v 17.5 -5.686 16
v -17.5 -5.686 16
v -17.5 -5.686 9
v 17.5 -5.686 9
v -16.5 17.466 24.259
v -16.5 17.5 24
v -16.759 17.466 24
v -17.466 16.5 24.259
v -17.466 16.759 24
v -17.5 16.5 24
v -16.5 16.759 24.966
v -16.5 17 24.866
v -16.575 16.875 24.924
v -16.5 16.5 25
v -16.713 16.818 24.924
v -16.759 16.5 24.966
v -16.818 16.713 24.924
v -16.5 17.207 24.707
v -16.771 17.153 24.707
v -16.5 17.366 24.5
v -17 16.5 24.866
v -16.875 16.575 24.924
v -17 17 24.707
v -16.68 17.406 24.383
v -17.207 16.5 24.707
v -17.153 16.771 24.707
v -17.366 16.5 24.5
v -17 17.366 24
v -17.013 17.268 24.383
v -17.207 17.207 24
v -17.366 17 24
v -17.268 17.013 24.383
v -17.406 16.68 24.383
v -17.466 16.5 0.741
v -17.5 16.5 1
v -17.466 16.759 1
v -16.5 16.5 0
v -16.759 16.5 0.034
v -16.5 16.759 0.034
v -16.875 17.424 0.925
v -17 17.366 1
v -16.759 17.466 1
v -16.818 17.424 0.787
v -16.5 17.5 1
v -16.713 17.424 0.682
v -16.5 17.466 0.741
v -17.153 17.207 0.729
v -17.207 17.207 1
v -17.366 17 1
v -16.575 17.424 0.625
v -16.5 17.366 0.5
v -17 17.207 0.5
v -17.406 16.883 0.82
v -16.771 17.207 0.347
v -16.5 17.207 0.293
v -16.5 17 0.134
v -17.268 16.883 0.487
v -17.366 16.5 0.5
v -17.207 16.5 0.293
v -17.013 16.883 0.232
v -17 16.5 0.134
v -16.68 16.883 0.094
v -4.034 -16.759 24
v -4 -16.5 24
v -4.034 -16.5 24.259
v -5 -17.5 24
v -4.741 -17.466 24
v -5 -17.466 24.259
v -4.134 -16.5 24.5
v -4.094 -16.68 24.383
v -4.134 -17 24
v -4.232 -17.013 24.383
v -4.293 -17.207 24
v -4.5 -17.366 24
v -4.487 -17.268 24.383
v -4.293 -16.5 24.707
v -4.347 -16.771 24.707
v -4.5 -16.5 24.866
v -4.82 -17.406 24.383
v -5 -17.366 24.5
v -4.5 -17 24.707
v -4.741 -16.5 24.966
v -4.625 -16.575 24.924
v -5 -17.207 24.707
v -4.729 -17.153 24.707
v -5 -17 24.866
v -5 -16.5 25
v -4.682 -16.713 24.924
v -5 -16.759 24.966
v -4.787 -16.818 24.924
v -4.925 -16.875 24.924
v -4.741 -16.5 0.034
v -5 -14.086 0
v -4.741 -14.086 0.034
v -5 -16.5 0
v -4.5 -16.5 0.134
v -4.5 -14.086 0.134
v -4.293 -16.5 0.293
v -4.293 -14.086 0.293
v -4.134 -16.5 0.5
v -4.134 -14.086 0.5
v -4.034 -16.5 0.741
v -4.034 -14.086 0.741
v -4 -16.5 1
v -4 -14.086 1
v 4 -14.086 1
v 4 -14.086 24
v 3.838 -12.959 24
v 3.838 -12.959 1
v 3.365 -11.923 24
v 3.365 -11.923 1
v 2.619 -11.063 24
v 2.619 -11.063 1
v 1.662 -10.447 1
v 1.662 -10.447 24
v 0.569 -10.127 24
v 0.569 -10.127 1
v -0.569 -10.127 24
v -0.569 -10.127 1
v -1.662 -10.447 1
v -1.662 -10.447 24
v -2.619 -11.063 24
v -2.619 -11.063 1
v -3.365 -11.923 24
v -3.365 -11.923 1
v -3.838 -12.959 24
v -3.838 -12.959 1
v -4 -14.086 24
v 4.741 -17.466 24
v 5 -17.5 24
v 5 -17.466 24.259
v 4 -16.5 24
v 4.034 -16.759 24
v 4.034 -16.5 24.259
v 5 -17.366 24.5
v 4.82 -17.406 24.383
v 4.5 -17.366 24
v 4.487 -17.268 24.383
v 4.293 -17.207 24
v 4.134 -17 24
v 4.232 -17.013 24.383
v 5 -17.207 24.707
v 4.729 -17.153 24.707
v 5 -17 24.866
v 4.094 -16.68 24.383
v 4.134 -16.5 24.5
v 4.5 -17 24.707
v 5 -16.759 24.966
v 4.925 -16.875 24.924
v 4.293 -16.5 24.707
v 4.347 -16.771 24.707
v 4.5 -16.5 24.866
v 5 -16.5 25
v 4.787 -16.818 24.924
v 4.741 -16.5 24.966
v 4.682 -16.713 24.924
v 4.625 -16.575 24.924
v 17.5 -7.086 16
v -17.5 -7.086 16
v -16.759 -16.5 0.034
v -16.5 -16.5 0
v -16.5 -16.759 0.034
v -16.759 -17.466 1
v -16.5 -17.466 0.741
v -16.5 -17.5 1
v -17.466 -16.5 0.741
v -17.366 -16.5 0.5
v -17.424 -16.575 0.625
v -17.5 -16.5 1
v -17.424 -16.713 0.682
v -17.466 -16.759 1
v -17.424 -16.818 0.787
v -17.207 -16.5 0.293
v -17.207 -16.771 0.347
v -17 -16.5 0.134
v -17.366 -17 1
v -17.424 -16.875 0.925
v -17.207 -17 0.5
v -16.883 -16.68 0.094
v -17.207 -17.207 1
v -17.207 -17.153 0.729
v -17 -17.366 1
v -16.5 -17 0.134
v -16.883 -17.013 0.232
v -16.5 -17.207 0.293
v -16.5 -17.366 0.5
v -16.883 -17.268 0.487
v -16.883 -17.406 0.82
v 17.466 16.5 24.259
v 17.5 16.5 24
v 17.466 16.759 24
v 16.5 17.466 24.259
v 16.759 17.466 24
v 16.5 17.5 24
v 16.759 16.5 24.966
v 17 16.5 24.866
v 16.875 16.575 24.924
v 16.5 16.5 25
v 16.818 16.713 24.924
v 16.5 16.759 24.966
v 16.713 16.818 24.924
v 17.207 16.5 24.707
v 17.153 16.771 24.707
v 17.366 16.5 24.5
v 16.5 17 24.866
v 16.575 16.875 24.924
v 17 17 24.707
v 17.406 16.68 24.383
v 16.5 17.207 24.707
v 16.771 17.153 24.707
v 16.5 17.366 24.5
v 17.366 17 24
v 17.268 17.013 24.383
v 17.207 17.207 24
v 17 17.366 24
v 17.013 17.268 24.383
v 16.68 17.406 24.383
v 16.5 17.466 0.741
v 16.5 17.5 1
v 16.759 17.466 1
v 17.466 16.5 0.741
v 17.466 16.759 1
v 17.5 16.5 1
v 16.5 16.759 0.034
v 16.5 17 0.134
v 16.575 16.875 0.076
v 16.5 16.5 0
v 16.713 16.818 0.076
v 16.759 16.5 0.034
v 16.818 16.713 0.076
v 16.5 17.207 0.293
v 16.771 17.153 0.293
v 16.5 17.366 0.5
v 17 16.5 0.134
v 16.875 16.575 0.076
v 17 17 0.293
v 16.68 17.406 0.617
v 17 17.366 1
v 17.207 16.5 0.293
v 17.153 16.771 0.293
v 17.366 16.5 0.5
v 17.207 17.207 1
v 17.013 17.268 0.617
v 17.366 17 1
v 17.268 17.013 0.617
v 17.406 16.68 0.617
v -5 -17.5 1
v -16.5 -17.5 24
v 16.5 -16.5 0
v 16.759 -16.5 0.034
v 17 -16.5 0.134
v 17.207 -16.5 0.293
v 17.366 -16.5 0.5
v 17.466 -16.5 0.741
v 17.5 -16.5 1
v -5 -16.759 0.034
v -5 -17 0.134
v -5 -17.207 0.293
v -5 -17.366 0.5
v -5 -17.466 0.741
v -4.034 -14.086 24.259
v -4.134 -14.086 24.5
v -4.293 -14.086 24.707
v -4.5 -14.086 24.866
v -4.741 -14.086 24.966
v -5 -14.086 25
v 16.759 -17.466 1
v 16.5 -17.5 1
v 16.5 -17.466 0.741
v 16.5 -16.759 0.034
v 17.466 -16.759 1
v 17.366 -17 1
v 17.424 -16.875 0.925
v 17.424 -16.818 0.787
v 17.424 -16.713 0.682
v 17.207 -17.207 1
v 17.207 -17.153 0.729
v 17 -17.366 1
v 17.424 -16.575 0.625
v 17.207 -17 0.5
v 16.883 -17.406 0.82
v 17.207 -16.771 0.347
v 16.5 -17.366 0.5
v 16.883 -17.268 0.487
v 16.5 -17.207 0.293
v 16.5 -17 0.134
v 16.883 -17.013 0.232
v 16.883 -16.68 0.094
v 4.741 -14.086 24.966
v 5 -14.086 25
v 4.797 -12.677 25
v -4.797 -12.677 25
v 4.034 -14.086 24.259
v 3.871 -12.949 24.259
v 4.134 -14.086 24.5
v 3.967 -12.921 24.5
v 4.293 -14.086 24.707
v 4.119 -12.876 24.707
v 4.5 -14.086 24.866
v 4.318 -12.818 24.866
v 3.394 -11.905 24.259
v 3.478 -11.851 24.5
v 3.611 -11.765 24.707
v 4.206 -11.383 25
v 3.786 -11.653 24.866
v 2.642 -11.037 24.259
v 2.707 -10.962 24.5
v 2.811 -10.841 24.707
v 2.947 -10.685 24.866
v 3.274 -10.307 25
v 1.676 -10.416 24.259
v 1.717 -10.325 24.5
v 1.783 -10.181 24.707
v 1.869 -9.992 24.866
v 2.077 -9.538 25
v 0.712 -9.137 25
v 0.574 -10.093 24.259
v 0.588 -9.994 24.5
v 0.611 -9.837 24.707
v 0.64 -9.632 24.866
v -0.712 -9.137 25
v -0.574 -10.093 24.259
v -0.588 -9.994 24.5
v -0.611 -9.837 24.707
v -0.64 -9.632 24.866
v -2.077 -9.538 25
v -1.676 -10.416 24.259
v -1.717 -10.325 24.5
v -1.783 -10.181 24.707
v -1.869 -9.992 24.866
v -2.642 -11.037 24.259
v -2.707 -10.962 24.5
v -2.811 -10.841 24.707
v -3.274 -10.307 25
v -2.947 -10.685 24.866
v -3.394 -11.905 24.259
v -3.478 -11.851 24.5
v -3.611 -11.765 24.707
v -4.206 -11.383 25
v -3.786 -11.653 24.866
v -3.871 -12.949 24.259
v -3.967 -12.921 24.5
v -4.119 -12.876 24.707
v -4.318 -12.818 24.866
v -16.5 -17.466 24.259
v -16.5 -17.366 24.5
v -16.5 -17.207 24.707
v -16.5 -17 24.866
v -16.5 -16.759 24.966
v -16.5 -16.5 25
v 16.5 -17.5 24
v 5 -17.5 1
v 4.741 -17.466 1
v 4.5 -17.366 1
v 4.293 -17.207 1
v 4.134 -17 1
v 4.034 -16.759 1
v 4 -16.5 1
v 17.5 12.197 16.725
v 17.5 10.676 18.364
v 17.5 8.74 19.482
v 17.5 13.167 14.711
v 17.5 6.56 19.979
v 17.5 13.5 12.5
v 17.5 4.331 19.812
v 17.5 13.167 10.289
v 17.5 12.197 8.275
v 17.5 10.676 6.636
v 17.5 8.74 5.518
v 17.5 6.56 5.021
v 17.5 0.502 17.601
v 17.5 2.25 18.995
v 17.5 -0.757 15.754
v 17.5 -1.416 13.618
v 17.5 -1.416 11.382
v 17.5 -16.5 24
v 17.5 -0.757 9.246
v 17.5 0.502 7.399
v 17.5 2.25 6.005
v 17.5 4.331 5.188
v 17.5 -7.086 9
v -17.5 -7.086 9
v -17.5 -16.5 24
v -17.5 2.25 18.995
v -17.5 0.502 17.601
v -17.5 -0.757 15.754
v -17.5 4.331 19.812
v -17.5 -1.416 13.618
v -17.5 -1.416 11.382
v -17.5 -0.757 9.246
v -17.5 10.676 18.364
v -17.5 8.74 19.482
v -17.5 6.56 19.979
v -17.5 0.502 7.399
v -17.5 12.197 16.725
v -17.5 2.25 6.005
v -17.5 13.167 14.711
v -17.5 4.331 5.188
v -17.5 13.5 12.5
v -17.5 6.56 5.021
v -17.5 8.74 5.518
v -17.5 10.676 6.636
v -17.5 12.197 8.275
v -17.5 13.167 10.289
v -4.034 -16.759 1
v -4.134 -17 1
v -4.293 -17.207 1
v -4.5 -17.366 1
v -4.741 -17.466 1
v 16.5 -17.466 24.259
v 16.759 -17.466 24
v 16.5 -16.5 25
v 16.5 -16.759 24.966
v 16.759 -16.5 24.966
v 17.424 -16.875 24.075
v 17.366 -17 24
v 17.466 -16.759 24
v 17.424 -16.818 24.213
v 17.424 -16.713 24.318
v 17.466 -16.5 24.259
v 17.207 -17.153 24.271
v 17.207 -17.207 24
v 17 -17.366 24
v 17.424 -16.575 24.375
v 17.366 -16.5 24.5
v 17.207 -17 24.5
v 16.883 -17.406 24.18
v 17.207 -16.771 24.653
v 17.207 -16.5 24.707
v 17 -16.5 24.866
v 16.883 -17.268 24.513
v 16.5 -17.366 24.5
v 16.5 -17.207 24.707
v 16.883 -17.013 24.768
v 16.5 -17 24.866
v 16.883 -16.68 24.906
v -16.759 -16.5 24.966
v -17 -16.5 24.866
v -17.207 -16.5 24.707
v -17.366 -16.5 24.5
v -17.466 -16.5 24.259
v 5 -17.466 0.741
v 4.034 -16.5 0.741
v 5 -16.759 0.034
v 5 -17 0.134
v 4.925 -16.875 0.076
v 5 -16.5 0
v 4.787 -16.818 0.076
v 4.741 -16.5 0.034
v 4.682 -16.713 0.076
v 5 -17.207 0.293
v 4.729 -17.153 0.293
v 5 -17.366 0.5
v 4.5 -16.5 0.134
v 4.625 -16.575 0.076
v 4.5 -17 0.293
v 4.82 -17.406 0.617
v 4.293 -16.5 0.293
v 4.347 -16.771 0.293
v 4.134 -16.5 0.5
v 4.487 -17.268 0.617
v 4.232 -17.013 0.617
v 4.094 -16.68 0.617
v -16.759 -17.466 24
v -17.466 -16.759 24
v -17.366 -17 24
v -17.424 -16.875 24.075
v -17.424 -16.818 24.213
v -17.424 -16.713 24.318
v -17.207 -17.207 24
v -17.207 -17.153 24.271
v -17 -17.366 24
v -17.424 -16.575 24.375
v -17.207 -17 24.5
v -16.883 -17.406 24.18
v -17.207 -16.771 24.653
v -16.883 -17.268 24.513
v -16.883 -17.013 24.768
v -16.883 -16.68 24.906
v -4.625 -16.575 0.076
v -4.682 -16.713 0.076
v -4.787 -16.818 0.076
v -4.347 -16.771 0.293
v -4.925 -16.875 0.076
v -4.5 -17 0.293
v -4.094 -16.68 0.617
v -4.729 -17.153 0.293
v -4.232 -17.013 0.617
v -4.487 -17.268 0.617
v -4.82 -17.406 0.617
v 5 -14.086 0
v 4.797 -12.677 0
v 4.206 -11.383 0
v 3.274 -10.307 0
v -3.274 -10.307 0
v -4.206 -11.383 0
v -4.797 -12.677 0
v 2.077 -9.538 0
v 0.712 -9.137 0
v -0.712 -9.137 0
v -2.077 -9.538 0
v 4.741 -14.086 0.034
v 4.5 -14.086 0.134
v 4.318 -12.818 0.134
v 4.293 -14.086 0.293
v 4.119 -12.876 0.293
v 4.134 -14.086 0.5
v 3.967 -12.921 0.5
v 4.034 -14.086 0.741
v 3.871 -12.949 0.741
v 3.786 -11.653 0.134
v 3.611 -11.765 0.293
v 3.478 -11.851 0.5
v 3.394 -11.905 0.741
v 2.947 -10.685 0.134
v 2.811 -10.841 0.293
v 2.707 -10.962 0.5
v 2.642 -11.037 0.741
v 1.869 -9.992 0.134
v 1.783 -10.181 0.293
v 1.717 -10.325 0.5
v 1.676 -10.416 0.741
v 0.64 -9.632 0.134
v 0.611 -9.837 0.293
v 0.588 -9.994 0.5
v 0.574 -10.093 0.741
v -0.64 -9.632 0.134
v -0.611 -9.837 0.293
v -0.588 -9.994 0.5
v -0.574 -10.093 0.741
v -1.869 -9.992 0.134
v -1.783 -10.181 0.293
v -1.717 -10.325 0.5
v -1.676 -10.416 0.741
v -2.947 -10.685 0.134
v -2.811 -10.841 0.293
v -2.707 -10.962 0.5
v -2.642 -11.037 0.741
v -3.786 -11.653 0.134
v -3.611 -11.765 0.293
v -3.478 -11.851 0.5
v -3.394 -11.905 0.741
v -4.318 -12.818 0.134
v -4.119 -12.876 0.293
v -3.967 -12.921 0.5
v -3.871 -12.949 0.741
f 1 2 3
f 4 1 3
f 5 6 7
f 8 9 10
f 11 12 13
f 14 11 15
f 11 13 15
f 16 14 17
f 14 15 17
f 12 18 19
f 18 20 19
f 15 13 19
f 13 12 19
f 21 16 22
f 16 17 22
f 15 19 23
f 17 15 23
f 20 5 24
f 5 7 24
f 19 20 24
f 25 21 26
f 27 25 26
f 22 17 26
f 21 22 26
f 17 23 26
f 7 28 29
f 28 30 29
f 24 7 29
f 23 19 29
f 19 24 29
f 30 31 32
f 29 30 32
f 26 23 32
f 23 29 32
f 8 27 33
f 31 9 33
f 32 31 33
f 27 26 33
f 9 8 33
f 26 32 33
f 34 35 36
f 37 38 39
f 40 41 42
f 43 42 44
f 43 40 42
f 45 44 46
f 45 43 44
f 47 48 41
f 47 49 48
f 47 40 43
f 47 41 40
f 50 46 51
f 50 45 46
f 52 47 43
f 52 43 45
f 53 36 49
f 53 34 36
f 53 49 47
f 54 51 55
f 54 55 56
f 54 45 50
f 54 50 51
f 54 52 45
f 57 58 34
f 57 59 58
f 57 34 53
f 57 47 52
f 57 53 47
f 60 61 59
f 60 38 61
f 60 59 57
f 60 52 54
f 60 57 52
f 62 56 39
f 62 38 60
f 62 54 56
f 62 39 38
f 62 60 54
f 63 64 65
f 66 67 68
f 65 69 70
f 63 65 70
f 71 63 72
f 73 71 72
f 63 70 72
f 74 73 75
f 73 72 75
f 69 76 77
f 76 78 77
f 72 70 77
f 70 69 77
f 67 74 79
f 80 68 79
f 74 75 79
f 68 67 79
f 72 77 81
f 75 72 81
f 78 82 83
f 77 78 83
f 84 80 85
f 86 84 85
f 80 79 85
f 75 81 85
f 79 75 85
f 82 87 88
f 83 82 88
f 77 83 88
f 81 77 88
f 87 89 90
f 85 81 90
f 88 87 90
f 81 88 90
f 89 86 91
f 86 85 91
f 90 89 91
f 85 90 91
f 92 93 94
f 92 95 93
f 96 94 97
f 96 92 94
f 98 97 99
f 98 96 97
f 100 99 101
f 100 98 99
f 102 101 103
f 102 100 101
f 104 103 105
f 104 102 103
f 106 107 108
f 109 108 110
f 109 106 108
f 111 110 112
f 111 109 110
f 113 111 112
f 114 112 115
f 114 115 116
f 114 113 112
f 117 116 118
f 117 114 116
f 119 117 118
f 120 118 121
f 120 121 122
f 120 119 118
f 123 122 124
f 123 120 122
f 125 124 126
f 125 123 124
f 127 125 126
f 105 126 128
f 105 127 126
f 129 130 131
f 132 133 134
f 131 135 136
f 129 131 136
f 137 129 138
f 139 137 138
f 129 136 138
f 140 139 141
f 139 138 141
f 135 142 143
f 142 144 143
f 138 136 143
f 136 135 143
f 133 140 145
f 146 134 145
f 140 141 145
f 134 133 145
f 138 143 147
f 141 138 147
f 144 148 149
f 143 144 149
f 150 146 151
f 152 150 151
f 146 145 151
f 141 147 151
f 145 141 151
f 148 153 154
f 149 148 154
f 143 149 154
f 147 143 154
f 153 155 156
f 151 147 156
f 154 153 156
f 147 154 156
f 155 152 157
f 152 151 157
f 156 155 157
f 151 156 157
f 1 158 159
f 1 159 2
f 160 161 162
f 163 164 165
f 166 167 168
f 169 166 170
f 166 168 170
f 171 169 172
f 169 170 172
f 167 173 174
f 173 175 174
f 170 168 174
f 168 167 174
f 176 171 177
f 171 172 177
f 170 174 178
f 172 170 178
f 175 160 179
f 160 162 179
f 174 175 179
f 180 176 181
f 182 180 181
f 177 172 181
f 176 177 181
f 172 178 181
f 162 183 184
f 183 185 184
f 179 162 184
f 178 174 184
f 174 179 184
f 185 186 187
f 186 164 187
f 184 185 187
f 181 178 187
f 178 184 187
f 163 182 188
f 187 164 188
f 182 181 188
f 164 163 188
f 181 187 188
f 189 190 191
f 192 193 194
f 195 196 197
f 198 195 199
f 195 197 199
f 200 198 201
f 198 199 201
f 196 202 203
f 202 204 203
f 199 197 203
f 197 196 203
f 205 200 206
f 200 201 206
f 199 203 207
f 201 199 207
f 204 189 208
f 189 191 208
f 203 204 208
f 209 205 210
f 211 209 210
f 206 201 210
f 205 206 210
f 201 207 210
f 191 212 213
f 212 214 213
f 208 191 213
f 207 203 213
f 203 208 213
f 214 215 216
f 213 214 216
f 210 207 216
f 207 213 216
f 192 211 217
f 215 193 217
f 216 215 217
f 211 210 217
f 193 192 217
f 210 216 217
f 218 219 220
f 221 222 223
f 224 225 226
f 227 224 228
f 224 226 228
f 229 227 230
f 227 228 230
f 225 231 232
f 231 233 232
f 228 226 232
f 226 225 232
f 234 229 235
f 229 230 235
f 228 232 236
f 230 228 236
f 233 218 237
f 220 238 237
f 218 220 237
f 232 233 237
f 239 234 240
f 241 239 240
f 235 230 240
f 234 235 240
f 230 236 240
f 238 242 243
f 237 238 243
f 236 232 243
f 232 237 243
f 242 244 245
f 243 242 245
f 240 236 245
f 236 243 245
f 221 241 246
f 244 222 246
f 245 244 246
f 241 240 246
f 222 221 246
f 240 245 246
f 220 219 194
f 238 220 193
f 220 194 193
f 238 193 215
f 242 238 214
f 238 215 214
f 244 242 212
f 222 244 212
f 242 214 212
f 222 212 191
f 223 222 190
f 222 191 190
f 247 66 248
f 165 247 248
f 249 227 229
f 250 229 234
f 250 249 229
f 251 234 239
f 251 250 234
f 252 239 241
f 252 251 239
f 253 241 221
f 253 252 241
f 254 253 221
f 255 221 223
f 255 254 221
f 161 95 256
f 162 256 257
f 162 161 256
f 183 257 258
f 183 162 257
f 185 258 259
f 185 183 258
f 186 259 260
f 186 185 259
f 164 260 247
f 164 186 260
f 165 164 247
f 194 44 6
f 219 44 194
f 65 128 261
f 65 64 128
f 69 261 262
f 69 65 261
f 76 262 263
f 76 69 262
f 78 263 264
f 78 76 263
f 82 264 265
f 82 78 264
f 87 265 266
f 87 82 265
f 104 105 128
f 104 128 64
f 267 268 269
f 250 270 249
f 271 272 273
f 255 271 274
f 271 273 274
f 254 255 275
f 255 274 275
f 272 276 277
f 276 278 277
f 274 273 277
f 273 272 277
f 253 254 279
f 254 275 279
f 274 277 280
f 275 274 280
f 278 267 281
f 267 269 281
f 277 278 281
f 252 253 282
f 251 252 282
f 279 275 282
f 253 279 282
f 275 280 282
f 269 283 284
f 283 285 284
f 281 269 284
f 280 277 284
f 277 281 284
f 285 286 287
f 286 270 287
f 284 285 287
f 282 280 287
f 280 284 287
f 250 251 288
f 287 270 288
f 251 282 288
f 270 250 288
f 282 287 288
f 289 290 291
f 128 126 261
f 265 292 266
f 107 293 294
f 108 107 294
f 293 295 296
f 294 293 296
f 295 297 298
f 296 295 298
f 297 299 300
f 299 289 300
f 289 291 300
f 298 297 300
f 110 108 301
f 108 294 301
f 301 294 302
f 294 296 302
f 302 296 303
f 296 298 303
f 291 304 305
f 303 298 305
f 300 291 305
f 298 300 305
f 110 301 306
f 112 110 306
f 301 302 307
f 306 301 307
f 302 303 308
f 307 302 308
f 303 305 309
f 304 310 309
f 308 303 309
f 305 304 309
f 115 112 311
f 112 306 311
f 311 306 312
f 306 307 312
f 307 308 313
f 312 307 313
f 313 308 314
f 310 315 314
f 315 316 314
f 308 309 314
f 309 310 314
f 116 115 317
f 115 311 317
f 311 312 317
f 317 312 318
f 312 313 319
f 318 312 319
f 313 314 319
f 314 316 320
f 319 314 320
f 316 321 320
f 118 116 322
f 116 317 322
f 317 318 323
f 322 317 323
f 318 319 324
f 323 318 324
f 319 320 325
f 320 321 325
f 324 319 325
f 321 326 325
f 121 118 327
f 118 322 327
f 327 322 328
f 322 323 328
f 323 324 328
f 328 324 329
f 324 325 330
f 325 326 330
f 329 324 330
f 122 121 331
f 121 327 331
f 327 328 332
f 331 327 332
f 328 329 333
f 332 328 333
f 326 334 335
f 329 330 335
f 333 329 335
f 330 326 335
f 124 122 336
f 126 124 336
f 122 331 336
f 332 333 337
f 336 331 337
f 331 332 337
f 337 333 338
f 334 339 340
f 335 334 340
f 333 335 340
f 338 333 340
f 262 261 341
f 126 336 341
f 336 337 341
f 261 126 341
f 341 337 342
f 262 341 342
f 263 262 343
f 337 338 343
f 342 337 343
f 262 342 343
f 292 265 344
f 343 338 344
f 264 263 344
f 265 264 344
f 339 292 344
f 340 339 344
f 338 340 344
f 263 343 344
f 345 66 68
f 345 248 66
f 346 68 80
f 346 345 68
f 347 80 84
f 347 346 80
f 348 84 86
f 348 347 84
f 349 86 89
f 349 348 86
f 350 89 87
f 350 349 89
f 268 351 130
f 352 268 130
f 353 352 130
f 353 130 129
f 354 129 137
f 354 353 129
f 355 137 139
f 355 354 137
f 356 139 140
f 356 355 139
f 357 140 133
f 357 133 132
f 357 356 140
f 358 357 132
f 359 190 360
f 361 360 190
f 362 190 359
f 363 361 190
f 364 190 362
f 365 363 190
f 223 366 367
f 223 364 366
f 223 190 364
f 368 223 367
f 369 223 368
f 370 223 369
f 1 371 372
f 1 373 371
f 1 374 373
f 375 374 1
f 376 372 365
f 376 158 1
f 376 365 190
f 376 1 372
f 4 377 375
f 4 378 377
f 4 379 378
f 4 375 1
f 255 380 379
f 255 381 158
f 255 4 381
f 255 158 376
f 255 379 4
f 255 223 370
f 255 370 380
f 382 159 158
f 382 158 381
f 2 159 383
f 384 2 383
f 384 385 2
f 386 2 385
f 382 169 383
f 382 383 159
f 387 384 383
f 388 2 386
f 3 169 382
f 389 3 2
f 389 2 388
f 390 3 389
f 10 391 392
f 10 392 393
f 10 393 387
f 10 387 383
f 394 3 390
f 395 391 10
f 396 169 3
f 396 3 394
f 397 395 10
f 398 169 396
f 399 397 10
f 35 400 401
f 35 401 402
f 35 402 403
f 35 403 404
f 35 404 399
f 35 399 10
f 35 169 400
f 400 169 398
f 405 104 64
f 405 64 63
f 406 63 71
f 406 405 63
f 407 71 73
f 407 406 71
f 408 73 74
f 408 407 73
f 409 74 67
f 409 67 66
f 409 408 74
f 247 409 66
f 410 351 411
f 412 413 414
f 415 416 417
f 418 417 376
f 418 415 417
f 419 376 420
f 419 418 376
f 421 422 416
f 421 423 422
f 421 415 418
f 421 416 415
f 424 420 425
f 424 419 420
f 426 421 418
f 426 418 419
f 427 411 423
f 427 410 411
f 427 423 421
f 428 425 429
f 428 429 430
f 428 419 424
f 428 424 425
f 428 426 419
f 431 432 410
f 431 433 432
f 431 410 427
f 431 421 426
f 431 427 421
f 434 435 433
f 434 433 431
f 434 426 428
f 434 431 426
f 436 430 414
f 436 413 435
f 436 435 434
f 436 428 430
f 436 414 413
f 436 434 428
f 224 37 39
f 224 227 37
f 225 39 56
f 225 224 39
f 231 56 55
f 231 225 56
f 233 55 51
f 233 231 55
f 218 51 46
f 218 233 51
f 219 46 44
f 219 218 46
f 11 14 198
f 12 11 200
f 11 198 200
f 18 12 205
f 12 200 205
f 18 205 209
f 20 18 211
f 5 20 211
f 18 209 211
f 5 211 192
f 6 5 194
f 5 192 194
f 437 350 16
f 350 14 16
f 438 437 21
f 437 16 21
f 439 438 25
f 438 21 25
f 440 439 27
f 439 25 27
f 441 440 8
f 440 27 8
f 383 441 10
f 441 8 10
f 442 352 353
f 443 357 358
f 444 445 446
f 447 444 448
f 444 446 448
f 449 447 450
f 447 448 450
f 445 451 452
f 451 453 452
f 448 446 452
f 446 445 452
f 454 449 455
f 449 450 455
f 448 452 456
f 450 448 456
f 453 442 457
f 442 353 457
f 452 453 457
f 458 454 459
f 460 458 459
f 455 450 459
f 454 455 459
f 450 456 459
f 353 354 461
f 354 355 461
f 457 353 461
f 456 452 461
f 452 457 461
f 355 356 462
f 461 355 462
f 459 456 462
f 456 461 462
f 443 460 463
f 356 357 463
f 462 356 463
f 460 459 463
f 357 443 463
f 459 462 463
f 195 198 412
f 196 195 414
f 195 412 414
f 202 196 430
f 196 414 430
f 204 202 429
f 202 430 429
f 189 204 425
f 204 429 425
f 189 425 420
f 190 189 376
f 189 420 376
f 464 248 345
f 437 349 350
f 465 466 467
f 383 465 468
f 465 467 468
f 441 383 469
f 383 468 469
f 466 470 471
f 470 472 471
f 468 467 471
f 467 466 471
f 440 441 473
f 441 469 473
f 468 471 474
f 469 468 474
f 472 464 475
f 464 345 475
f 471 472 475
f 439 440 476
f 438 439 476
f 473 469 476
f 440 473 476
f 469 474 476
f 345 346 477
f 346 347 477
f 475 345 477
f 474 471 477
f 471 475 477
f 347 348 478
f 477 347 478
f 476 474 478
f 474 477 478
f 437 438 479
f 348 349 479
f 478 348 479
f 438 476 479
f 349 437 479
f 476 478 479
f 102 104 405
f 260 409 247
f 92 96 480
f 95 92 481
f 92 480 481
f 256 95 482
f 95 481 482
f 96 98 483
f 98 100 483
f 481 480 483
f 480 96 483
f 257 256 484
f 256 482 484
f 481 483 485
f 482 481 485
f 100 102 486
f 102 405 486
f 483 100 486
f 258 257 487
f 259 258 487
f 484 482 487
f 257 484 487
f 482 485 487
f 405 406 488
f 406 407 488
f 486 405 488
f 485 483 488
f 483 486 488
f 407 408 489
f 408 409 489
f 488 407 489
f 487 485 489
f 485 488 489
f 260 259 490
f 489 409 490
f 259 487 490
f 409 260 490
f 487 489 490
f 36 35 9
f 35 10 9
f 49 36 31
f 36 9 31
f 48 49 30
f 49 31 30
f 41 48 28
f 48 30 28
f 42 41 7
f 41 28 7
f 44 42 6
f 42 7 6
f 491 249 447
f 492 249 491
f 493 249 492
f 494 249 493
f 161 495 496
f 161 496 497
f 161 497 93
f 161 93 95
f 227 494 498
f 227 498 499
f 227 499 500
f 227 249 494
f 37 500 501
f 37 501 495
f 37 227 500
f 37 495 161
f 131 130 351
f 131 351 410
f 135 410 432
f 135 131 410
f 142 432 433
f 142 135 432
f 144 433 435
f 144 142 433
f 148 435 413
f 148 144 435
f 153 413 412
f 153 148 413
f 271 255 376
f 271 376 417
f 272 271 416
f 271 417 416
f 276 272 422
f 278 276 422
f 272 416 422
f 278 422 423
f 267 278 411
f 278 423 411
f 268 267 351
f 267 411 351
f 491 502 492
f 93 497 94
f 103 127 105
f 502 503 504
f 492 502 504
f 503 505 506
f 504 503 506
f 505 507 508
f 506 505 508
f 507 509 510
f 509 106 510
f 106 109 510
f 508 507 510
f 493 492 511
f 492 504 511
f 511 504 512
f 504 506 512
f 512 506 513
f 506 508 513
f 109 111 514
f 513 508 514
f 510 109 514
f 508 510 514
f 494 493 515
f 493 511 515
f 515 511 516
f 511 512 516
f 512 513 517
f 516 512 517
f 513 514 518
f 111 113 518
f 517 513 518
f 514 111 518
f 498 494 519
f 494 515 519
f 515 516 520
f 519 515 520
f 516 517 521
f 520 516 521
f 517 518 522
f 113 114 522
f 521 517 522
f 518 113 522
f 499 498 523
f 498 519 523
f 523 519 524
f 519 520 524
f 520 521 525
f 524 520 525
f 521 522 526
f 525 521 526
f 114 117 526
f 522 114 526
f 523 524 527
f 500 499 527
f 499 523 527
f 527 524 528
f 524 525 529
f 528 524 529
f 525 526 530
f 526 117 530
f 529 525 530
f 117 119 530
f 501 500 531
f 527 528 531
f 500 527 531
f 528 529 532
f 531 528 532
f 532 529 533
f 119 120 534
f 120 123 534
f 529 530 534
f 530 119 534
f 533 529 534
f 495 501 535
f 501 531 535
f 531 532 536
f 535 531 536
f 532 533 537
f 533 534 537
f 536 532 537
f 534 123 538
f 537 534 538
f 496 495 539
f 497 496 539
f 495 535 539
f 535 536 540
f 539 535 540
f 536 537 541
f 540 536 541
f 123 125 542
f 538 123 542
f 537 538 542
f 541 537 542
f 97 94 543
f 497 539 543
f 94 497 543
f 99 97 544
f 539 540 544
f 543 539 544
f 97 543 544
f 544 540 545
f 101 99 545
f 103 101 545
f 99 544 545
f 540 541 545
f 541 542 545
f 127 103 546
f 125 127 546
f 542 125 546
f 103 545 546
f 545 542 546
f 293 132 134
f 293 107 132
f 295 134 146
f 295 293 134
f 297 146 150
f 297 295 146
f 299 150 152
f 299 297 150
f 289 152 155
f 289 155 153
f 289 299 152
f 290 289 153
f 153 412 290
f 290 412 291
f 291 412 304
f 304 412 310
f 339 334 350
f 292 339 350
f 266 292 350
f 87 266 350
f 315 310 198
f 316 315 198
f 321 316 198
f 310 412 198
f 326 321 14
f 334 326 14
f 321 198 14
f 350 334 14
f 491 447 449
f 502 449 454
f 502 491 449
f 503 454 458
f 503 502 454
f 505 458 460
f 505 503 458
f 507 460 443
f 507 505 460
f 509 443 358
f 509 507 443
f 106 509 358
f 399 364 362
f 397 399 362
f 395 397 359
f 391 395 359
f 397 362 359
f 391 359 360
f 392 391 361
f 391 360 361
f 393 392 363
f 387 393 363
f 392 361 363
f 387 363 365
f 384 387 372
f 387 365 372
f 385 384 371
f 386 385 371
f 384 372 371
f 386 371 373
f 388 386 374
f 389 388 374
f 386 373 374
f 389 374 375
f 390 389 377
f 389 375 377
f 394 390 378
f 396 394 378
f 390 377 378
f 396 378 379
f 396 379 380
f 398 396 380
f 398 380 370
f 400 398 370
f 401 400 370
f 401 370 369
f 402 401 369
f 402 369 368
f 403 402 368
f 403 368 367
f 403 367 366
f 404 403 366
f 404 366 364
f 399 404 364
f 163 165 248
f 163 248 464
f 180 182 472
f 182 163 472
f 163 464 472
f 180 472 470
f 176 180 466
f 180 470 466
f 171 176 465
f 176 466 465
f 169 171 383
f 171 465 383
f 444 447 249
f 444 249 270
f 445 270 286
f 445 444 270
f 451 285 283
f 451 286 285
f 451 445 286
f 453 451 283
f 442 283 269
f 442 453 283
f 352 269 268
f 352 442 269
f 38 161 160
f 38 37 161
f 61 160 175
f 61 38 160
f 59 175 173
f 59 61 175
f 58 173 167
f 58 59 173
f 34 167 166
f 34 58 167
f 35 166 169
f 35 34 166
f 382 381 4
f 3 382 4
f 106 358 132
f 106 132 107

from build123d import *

# Parameters (mm, degrees)
ESTRUSIONE_ESTRUSIONE1_DEPTH = 25
SCHIZZO2_R                   = 7.5
TAGLIO_ESTRUSIONE1_DEPTH     = 47.435439053
SCHIZZO3_W                   = 7
SCHIZZO3_H                   = 1.4
TAGLIO_ESTRUSIONE2_DEPTH     = 47.435439053
RACCORDO2_R                  = 1


with BuildPart() as part:
    # Schizzo1 → Estrusione-Estrusione1 (new body)
    with BuildSketch(Plane.XY):
        with BuildLine():
            Line((-4, -14.085786438), (-4, -16.5))
            ThreePointArc((-4, -16.5), (-4.292893219, -17.207106781), (-5, -17.5))
            Line((-5, -17.5), (-17.5, -17.5))
            Line((-17.5, -17.5), (-17.5, 17.5))
            Line((-17.5, 17.5), (17.5, 17.5))
            Line((17.5, 17.5), (17.5, -17.5))
            Line((17.5, -17.5), (5, -17.5))
            ThreePointArc((5, -17.5), (4.292893219, -17.207106781), (4, -16.5))
            Line((4, -16.5), (4, -14.085786438))
            ThreePointArc((4, -14.085786438), (0, -10.085786438), (-4, -14.085786438))
        make_face()
    extrude(amount=ESTRUSIONE_ESTRUSIONE1_DEPTH)

    # Schizzo2 → Taglio-Estrusione1 (cut, through all)
    with BuildSketch(Plane(origin=(17.5, 0, 0), x_dir=(0, 0, -1), z_dir=(1, 0, 0))):
        with Locations(Location((-12.5, 6, 0), (0, 0, 90))):
            Circle(SCHIZZO2_R)
    extrude(amount=-TAGLIO_ESTRUSIONE1_DEPTH, mode=Mode.SUBTRACT)

    # Schizzo3 → Taglio-Estrusione2 (cut, through all)
    with BuildSketch(Plane(origin=(17.5, 0, 0), x_dir=(0, 0, -1), z_dir=(1, 0, 0))):
        with Locations((-12.5, -6.385786438)):
            Rectangle(SCHIZZO3_W, SCHIZZO3_H)
    extrude(amount=-TAGLIO_ESTRUSIONE2_DEPTH, mode=Mode.SUBTRACT)

    # Raccordo2
    raccordo2_edges = [part.edges().sort_by_distance(p)[0] for p in [
        (-4.292893219, -17.207106781, 25),
        (11.25, -17.5, 0),
        (4.292893219, -17.207106781, 0),
        (4, -15.292893219, 0),
        (0, -10.085786438, 0),
        (-4, -15.292893219, 0),
        (-4.292893219, -17.207106781, 0),
        (-11.25, -17.5, 0),
        (-17.5, 0, 0),
        (-4, -15.292893219, 25),
        (0, -10.085786438, 25),
        (-17.5, 17.5, 12.5),
        (17.5, 17.5, 12.5),
        (17.5, -17.5, 12.5),
        (-17.5, -17.5, 12.5),
        (4, -15.292893219, 25),
        (4.292893219, -17.207106781, 25),
        (11.25, -17.5, 25),
        (17.5, 0, 25),
        (0, 17.5, 25),
        (-17.5, 0, 25),
        (-11.25, -17.5, 25),
        (0, 17.5, 0),
        (17.5, 0, 0),
    ]]
    fillet(raccordo2_edges, radius=RACCORDO2_R)


solid = part.part
